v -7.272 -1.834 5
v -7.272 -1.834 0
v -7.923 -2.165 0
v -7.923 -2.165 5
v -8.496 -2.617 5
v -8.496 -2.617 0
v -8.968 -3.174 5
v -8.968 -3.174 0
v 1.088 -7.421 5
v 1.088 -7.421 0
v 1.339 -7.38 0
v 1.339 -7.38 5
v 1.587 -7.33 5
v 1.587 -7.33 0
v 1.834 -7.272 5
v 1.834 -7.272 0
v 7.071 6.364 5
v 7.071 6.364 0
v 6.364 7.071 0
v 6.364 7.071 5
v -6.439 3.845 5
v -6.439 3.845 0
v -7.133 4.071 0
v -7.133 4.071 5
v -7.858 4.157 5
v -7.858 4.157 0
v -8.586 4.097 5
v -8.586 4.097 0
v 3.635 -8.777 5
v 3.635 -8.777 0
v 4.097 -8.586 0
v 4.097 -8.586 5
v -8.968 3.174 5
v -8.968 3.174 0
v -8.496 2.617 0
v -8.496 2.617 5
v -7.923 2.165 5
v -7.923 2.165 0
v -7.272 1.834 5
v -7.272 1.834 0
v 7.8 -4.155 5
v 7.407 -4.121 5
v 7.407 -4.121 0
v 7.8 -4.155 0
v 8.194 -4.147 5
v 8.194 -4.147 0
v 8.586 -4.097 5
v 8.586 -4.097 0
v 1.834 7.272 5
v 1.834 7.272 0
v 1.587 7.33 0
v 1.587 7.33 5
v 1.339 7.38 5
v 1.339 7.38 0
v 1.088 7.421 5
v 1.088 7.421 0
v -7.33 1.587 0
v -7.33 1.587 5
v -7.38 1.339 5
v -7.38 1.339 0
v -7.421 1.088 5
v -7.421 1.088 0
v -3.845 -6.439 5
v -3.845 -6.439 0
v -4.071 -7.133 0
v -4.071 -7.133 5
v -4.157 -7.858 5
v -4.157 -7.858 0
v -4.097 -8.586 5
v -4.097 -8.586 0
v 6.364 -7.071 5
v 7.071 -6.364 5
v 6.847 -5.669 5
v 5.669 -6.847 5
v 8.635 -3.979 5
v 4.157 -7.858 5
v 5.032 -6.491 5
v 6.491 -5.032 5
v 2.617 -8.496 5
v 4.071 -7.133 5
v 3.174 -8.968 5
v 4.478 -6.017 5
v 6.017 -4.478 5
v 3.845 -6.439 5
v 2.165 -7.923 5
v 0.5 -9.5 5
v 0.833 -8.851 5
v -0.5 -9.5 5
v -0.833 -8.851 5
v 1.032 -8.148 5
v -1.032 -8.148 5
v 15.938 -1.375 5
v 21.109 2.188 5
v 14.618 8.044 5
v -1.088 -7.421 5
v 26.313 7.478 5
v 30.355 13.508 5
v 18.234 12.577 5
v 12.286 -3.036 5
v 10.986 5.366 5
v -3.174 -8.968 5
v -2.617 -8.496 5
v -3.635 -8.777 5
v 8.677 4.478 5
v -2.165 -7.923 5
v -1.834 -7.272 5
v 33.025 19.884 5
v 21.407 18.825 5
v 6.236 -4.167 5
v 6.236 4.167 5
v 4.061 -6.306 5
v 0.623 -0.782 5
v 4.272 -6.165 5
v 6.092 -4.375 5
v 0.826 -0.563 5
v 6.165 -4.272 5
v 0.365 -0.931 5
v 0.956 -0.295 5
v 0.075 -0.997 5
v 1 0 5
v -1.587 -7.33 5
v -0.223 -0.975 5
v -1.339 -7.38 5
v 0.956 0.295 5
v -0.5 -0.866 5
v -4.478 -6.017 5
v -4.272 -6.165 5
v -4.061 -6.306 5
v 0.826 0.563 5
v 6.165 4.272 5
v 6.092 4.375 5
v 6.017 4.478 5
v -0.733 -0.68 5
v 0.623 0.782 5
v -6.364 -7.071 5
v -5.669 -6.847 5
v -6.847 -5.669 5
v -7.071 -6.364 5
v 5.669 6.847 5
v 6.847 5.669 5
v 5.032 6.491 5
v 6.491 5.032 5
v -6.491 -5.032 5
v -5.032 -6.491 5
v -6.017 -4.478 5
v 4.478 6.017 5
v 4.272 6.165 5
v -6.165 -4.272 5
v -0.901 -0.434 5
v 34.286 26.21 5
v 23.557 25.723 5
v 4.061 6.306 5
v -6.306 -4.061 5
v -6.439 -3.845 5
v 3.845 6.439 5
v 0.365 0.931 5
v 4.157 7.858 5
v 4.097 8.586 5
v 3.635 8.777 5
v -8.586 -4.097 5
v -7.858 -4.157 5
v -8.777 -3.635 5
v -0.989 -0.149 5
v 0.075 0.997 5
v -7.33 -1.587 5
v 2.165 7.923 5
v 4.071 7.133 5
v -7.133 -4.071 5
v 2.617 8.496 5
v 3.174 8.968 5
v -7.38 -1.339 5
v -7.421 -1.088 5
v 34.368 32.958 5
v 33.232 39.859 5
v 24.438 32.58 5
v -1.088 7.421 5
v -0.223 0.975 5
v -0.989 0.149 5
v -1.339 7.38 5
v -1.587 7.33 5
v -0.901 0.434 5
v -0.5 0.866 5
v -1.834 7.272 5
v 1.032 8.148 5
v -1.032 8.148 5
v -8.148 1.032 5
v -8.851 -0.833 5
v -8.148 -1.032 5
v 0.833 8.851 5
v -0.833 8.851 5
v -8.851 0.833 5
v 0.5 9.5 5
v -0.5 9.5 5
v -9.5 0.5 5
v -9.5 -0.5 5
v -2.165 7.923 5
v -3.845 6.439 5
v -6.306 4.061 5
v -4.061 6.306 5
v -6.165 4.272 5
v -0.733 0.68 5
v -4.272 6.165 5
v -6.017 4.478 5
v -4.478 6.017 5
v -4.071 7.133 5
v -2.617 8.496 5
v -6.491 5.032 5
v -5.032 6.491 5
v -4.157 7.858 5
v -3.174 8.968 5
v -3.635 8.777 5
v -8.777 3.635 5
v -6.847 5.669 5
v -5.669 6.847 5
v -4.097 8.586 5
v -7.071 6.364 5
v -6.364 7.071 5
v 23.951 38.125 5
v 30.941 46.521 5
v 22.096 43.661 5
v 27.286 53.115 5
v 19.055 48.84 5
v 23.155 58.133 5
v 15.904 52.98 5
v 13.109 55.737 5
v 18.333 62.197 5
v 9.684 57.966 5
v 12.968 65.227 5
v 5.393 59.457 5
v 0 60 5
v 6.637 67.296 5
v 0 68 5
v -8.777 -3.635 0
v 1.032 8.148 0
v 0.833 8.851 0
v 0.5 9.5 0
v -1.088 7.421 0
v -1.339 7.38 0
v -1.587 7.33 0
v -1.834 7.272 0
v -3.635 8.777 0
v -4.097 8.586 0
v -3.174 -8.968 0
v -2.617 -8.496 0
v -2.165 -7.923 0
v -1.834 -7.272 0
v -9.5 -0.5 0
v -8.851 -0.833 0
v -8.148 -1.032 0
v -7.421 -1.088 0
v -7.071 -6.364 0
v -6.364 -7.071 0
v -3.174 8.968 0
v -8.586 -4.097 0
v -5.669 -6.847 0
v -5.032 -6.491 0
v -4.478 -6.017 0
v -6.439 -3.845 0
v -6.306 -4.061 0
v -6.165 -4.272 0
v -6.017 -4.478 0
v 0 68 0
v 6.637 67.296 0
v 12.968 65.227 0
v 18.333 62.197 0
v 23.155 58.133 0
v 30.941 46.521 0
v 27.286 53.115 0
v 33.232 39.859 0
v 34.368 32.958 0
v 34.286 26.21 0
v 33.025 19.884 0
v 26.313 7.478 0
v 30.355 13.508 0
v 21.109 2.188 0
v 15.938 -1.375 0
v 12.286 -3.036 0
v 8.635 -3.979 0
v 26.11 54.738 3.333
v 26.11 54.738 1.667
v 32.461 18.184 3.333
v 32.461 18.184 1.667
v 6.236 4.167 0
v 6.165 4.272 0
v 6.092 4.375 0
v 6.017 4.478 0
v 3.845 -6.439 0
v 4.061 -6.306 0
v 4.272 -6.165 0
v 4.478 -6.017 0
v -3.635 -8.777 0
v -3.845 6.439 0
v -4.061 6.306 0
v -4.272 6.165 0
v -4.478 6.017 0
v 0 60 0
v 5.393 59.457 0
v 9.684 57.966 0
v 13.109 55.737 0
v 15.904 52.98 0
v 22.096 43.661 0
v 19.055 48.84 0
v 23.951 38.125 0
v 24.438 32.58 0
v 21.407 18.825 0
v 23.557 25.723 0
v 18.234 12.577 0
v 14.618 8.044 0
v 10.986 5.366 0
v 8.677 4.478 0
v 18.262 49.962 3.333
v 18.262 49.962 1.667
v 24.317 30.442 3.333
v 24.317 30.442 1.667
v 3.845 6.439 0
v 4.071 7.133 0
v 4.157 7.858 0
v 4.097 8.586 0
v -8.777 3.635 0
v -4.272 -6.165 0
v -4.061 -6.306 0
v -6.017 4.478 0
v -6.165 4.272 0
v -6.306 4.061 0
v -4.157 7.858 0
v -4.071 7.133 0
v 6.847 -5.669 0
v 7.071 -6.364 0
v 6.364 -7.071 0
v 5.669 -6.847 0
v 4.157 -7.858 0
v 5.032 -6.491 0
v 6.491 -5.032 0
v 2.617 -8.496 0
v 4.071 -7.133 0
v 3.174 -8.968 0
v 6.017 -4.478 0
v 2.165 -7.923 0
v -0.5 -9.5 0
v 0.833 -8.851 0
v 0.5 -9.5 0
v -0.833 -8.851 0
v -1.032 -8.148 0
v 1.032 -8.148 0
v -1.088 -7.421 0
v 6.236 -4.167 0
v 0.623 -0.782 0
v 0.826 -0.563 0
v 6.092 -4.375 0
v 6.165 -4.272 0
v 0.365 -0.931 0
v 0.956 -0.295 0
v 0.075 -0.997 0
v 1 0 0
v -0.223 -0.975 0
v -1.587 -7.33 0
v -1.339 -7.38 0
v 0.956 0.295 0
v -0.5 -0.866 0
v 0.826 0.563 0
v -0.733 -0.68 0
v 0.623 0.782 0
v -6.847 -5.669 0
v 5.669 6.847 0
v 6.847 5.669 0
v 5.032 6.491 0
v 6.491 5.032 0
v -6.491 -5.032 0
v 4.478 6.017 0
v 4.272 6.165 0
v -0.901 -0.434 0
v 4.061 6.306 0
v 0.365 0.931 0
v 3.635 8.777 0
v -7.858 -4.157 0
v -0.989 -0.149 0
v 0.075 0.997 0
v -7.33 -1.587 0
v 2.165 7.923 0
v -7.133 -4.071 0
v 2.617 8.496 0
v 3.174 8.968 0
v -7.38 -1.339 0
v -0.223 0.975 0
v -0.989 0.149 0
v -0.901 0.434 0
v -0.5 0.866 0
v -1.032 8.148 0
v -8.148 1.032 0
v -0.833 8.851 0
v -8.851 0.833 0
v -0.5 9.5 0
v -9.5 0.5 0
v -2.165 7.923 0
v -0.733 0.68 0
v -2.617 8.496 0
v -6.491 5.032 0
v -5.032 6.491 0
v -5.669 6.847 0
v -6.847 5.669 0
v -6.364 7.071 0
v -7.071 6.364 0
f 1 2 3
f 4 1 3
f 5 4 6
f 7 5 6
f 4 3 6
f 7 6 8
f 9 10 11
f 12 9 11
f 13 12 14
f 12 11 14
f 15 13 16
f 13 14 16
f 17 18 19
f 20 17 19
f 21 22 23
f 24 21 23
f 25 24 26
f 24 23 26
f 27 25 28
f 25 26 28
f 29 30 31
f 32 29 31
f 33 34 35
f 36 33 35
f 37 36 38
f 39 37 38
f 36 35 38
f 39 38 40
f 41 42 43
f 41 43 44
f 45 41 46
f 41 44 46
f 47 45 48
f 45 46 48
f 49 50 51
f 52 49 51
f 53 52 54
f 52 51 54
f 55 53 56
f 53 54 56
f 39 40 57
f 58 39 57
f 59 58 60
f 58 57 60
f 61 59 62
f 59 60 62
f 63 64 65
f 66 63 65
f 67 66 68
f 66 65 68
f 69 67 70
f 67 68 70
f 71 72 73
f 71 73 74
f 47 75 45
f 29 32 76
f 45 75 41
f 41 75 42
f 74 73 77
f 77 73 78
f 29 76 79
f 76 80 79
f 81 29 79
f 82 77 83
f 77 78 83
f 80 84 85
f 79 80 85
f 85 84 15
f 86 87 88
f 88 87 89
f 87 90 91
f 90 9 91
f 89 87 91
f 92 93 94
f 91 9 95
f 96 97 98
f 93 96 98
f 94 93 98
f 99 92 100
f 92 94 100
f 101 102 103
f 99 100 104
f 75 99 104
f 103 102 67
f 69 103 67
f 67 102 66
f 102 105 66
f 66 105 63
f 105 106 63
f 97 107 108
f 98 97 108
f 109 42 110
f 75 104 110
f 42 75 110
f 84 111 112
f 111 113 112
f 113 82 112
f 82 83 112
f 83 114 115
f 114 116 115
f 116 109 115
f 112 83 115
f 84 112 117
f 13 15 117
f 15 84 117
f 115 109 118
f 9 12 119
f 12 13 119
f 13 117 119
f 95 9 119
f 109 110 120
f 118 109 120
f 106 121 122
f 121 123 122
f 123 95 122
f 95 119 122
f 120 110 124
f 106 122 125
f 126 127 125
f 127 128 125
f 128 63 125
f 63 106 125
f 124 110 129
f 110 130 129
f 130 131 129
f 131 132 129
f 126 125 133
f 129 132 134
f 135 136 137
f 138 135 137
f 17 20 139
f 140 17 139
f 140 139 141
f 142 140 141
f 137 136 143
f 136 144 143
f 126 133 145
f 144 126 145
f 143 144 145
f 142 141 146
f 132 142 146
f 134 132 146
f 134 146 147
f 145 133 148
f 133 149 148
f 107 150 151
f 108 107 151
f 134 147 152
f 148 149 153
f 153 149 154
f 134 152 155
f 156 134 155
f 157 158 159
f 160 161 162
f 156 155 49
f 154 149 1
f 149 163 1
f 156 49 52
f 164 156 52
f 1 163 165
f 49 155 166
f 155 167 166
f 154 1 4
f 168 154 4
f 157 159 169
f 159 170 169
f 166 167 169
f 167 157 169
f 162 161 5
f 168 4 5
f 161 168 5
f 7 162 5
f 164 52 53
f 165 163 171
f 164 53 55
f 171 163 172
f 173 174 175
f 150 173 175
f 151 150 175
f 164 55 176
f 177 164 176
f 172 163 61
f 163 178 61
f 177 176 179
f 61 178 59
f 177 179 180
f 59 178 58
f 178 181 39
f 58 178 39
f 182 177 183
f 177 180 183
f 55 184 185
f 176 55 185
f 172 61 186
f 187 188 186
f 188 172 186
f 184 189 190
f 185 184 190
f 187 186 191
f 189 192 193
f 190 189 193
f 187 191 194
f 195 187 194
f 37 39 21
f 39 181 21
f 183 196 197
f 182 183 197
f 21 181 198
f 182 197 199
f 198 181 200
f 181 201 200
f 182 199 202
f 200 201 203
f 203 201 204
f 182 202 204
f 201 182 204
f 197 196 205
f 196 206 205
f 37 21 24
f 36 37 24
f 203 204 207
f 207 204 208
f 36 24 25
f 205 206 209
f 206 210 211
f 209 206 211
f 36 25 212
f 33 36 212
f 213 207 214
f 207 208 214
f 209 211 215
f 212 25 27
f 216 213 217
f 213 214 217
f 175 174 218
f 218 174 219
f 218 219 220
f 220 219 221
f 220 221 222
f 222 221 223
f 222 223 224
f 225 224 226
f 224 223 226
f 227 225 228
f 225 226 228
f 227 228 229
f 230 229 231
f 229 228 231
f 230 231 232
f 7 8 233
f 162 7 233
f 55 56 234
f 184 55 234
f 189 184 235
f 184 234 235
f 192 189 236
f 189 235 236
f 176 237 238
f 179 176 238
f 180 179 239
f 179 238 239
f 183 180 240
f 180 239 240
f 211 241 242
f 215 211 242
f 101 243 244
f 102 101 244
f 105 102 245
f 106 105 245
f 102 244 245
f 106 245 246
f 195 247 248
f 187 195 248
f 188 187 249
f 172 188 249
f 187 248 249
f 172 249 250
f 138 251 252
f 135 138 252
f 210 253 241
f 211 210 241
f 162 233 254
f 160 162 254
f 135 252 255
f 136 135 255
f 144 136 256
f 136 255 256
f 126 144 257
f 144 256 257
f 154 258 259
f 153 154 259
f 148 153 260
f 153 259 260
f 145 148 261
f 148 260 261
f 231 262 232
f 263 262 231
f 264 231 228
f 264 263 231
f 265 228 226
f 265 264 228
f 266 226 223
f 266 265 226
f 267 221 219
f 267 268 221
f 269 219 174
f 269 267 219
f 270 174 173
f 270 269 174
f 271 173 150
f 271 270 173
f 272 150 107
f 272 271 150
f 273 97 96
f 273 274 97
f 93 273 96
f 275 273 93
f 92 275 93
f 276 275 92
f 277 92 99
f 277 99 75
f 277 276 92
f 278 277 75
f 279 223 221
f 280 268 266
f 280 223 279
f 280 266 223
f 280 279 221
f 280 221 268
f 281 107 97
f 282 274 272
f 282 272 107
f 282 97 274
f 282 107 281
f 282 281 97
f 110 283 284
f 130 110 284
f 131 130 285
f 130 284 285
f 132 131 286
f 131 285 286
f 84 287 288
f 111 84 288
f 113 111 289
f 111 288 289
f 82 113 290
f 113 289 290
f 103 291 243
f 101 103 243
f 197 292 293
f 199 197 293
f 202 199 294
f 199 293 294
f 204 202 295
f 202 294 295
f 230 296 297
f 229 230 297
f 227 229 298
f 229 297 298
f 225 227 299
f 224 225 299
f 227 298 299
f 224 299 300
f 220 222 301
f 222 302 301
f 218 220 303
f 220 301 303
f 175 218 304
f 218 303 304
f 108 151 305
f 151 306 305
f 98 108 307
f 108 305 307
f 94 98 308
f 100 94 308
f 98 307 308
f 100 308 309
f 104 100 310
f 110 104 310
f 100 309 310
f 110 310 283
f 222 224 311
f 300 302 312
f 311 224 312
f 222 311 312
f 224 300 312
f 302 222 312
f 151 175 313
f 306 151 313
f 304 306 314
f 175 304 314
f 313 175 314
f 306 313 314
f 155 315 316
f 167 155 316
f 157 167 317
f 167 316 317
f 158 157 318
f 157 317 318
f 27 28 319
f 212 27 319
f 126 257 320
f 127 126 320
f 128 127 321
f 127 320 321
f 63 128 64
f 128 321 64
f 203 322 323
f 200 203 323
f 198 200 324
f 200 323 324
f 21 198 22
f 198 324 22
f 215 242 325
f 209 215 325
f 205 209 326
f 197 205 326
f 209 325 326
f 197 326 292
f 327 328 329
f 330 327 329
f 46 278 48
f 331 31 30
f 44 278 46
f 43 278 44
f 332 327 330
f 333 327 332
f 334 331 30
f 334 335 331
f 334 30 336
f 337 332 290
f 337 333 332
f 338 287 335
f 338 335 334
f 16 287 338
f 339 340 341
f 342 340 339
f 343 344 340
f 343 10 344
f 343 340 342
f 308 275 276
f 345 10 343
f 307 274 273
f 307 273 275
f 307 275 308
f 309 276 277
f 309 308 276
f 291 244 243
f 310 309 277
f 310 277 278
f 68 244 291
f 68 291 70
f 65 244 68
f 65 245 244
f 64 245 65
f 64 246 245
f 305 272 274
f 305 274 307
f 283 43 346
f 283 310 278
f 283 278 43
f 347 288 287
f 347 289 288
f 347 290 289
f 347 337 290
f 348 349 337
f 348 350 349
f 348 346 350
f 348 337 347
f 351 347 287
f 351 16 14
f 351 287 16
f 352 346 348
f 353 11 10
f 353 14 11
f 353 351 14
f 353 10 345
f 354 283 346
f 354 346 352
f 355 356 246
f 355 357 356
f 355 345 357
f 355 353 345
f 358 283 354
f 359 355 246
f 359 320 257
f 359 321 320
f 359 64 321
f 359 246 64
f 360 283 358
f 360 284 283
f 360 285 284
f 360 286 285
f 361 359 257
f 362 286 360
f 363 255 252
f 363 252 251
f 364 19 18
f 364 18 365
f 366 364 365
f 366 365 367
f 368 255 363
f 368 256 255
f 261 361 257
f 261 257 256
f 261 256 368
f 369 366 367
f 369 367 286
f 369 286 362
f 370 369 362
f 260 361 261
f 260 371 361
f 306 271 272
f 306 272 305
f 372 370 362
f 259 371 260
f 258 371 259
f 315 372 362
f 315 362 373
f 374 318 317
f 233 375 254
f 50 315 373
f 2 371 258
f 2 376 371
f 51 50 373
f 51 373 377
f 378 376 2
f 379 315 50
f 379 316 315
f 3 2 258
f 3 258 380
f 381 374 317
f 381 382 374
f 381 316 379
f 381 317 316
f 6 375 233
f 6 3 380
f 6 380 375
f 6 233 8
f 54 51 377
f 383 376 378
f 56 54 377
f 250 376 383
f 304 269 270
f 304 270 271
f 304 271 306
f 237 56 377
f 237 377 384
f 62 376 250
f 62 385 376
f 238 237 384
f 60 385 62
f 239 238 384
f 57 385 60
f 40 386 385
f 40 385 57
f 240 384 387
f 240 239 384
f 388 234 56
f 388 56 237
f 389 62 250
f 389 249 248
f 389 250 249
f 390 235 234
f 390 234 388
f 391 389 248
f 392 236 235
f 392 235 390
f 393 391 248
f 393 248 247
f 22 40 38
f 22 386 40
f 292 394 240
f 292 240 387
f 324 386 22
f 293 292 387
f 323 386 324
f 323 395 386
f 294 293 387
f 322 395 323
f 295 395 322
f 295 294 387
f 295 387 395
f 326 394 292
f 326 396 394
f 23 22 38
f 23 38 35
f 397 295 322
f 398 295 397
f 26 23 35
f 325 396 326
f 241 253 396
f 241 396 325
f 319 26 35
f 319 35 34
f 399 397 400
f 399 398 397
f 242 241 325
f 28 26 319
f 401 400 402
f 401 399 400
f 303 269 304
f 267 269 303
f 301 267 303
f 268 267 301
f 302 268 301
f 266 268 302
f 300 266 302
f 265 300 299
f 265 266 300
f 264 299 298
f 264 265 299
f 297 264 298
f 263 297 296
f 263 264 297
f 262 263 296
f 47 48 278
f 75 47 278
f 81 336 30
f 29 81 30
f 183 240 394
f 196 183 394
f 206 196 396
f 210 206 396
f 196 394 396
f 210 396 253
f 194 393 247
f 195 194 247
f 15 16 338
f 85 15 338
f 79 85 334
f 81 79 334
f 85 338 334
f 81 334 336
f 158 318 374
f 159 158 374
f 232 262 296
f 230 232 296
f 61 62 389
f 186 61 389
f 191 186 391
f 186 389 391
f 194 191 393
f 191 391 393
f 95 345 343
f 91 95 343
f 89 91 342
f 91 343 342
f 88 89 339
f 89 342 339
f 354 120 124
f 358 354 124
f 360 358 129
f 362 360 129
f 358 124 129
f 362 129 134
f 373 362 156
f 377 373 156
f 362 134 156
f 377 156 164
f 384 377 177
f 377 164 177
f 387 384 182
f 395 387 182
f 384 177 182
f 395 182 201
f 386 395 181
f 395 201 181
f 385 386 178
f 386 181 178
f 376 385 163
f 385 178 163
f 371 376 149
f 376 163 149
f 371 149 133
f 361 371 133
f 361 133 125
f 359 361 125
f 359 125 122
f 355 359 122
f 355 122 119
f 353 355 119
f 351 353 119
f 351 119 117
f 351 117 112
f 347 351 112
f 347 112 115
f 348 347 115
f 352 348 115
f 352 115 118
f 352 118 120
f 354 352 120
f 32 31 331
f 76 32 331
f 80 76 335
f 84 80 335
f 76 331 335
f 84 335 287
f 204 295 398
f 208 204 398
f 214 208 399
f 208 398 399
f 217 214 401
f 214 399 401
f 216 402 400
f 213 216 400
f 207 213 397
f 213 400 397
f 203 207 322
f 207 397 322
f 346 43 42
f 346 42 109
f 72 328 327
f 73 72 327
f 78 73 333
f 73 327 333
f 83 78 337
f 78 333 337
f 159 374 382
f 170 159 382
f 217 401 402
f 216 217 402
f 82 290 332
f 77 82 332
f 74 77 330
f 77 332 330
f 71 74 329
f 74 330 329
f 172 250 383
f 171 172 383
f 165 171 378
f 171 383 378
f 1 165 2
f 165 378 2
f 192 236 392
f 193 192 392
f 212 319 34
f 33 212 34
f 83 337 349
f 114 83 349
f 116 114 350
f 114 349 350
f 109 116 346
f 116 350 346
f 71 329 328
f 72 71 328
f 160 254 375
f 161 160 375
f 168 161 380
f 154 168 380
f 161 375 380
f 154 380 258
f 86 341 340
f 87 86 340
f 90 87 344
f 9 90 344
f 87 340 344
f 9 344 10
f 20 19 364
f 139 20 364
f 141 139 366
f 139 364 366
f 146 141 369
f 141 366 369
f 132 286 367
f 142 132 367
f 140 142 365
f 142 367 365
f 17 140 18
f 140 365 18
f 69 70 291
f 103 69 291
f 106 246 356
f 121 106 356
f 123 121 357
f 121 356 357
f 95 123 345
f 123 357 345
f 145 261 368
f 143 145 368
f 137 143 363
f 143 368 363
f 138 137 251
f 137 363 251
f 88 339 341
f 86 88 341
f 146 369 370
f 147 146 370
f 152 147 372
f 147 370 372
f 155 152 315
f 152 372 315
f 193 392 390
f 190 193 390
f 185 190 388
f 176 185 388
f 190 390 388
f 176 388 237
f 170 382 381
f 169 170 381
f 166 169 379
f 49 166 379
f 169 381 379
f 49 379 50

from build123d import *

# Parameters (mm, degrees)
F1_DEPTH = 5
F2_R     = 1
F3_DEPTH = 5.001
F5_DEPTH = 5


with BuildPart() as f1:
    # F0 (on Top) → F1 (new body)
    with BuildSketch(Plane.XY):
        with BuildLine():
            ThreePointArc((7.4206173165, -1.0883191822), (7.4801280027, -0.5456052265), (7.5, 0))
            ThreePointArc((7.5, 0), (7.4801280027, 0.5456052265), (7.4206173165, 1.0883191822))
            ThreePointArc((7.4206173165, 1.0883191822), (7.355889603, 1.4631774151), (7.2722381774, 1.8342714877))
            ThreePointArc((7.2722381774, 1.8342714877), (6.9290964938, 2.8701257427), (6.4392747372, 3.8452231222))
            ThreePointArc((6.4392747372, 3.8452231222), (6.2360220923, 4.1667767476), (6.0167266989, 4.4776109513))
            ThreePointArc((6.0167266989, 4.4776109513), (5.3033008589, 5.3033008589), (4.4776109513, 6.0167266989))
            ThreePointArc((4.4776109513, 6.0167266989), (4.1667767476, 6.2360220923), (3.8452231222, 6.4392747372))
            ThreePointArc((3.8452231222, 6.4392747372), (2.8701257427, 6.9290964938), (1.8342714877, 7.2722381774))
            ThreePointArc((1.8342714877, 7.2722381774), (1.4631774151, 7.355889603), (1.0883191822, 7.4206173165))
            ThreePointArc((1.0883191822, 7.4206173165), (0, 7.5), (-1.0883191822, 7.4206173165))
            ThreePointArc((-1.0883191822, 7.4206173165), (-1.4631774151, 7.355889603), (-1.8342714877, 7.2722381774))
            ThreePointArc((-1.8342714877, 7.2722381774), (-2.8701257427, 6.9290964938), (-3.8452231222, 6.4392747372))
            ThreePointArc((-3.8452231222, 6.4392747372), (-4.1667767476, 6.2360220923), (-4.4776109513, 6.0167266989))
            ThreePointArc((-4.4776109513, 6.0167266989), (-5.3033008589, 5.3033008589), (-6.0167266989, 4.4776109513))
            ThreePointArc((-6.0167266989, 4.4776109513), (-6.2360220923, 4.1667767476), (-6.4392747372, 3.8452231222))
            ThreePointArc((-6.4392747372, 3.8452231222), (-6.9290964938, 2.8701257427), (-7.2722381774, 1.8342714877))
            ThreePointArc((-7.2722381774, 1.8342714877), (-7.355889603, 1.4631774151), (-7.4206173165, 1.0883191822))
            ThreePointArc((-7.4206173165, 1.0883191822), (-7.5, 0), (-7.4206173165, -1.0883191822))
            ThreePointArc((-7.4206173165, -1.0883191822), (-7.355889603, -1.4631774151), (-7.2722381774, -1.8342714877))
            ThreePointArc((-7.2722381774, -1.8342714877), (-6.9290964938, -2.8701257427), (-6.4392747372, -3.8452231222))
            ThreePointArc((-6.4392747372, -3.8452231222), (-6.2360220923, -4.1667767476), (-6.0167266989, -4.4776109513))
            ThreePointArc((-6.0167266989, -4.4776109513), (-5.3033008589, -5.3033008589), (-4.4776109513, -6.0167266989))
            ThreePointArc((-4.4776109513, -6.0167266989), (-4.1667767476, -6.2360220923), (-3.8452231222, -6.4392747372))
            ThreePointArc((-3.8452231222, -6.4392747372), (-2.8701257427, -6.9290964938), (-1.8342714877, -7.2722381774))
            ThreePointArc((-1.8342714877, -7.2722381774), (-1.4631774151, -7.355889603), (-1.0883191822, -7.4206173165))
            ThreePointArc((-1.0883191822, -7.4206173165), (0, -7.5), (1.0883191822, -7.4206173165))
            ThreePointArc((1.0883191822, -7.4206173165), (1.4631774151, -7.355889603), (1.8342714877, -7.2722381774))
            ThreePointArc((1.8342714877, -7.2722381774), (2.8701257427, -6.9290964938), (3.8452231222, -6.4392747372))
            ThreePointArc((3.8452231222, -6.4392747372), (4.1667767476, -6.2360220923), (4.4776109513, -6.0167266989))
            ThreePointArc((4.4776109513, -6.0167266989), (5.3033008589, -5.3033008589), (6.0167266989, -4.4776109513))
            ThreePointArc((6.0167266989, -4.4776109513), (6.2360220923, -4.1667767476), (6.4392747372, -3.8452231222))
            ThreePointArc((6.4392747372, -3.8452231222), (6.9290964938, -2.8701257427), (7.2722381774, -1.8342714877))
            ThreePointArc((7.2722381774, -1.8342714877), (7.355889603, -1.4631774151), (7.4206173165, -1.0883191822))
        make_face()
        with BuildLine():
            ThreePointArc((7.4206173165, 1.0883191822), (7.4801280027, 0.5456052265), (7.5, 0))
            ThreePointArc((7.5, 0), (7.4801280027, -0.5456052265), (7.4206173165, -1.0883191822))
            ThreePointArc((7.4206173165, -1.0883191822), (8.5043518229, -0.9498278009), (9.5, -0.5))
            Line((9.5, -0.5), (9.5, 0))
            Line((9.5, 0), (9.5, 0.5))
            ThreePointArc((9.5, 0.5), (8.5043518229, 0.9498278009), (7.4206173165, 1.0883191822))
        make_face()
        with BuildLine():
            ThreePointArc((6.4392747372, 3.8452231222), (6.9290964938, 2.8701257427), (7.2722381774, 1.8342714877))
            ThreePointArc((7.2722381774, 1.8342714877), (8.2204799494, 2.376948081), (8.968197275, 3.1735528412))
            Line((8.968197275, 3.1735528412), (8.7768555589, 3.6354926075))
            Line((8.7768555589, 3.6354926075), (8.5855138427, 4.0974323737))
            ThreePointArc((8.5855138427, 4.0974323737), (7.4935132234, 4.1320010103), (6.4392747372, 3.8452231222))
        make_face()
        with BuildLine():
            ThreePointArc((8.968197275, -3.1735528412), (8.2204799494, -2.376948081), (7.2722381774, -1.8342714877))
            ThreePointArc((7.2722381774, -1.8342714877), (6.9290964938, -2.8701257427), (6.4392747372, -3.8452231222))
            ThreePointArc((6.4392747372, -3.8452231222), (7.4935132234, -4.1320010103), (8.5855138427, -4.0974323737))
            Line((8.5855138427, -4.0974323737), (8.7768555589, -3.6354926075))
            Line((8.7768555589, -3.6354926075), (8.968197275, -3.1735528412))
        make_face()
        with BuildLine():
            ThreePointArc((4.4776109513, 6.0167266989), (5.3033008589, 5.3033008589), (6.0167266989, 4.4776109513))
            ThreePointArc((6.0167266989, 4.4776109513), (6.6851145225, 5.3418551646), (7.0710678119, 6.3639610307))
            Line((7.0710678119, 6.3639610307), (6.7175144213, 6.7175144213))
            Line((6.7175144213, 6.7175144213), (6.3639610307, 7.0710678119))
            ThreePointArc((6.3639610307, 7.0710678119), (5.3418551646, 6.6851145225), (4.4776109513, 6.0167266989))
        make_face()
        with BuildLine():
            ThreePointArc((7.0710678119, -6.3639610307), (6.6851145225, -5.3418551646), (6.0167266989, -4.4776109513))
            ThreePointArc((6.0167266989, -4.4776109513), (5.3033008589, -5.3033008589), (4.4776109513, -6.0167266989))
            ThreePointArc((4.4776109513, -6.0167266989), (5.3418551646, -6.6851145225), (6.3639610307, -7.0710678119))
            Line((6.3639610307, -7.0710678119), (6.7175144213, -6.7175144213))
            Line((6.7175144213, -6.7175144213), (7.0710678119, -6.3639610307))
        make_face()
        with BuildLine():
            ThreePointArc((1.8342714877, 7.2722381774), (2.8701257427, 6.9290964938), (3.8452231222, 6.4392747372))
            ThreePointArc((3.8452231222, 6.4392747372), (4.1320010103, 7.4935132234), (4.0974323737, 8.5855138427))
            Line((4.0974323737, 8.5855138427), (3.6354926075, 8.7768555589))
            Line((3.6354926075, 8.7768555589), (3.1735528412, 8.968197275))
            ThreePointArc((3.1735528412, 8.968197275), (2.376948081, 8.2204799494), (1.8342714877, 7.2722381774))
        make_face()
        with BuildLine():
            ThreePointArc((4.0974323737, -8.5855138427), (4.1320010103, -7.4935132234), (3.8452231222, -6.4392747372))
            ThreePointArc((3.8452231222, -6.4392747372), (2.8701257427, -6.9290964938), (1.8342714877, -7.2722381774))
            ThreePointArc((1.8342714877, -7.2722381774), (2.376948081, -8.2204799494), (3.1735528412, -8.968197275))
            Line((3.1735528412, -8.968197275), (3.6354926075, -8.7768555589))
            Line((3.6354926075, -8.7768555589), (4.0974323737, -8.5855138427))
        make_face()
        with BuildLine():
            ThreePointArc((-1.0883191822, 7.4206173165), (0, 7.5), (1.0883191822, 7.4206173165))
            ThreePointArc((1.0883191822, 7.4206173165), (0.9498278009, 8.5043518229), (0.5, 9.5))
            Line((0.5, 9.5), (0, 9.5))
            Line((0, 9.5), (-0.5, 9.5))
            ThreePointArc((-0.5, 9.5), (-0.9498278009, 8.5043518229), (-1.0883191822, 7.4206173165))
        make_face()
        with BuildLine():
            ThreePointArc((0.5, -9.5), (0.9498278009, -8.5043518229), (1.0883191822, -7.4206173165))
            ThreePointArc((1.0883191822, -7.4206173165), (0, -7.5), (-1.0883191822, -7.4206173165))
            ThreePointArc((-1.0883191822, -7.4206173165), (-0.9498278009, -8.5043518229), (-0.5, -9.5))
            Line((-0.5, -9.5), (0, -9.5))
            Line((0, -9.5), (0.5, -9.5))
        make_face()
        with BuildLine():
            ThreePointArc((-3.8452231222, 6.4392747372), (-2.8701257427, 6.9290964938), (-1.8342714877, 7.2722381774))
            ThreePointArc((-1.8342714877, 7.2722381774), (-2.376948081, 8.2204799494), (-3.1735528412, 8.968197275))
            Line((-3.1735528412, 8.968197275), (-3.6354926075, 8.7768555589))
            Line((-3.6354926075, 8.7768555589), (-4.0974323737, 8.5855138427))
            ThreePointArc((-4.0974323737, 8.5855138427), (-4.1320010103, 7.4935132234), (-3.8452231222, 6.4392747372))
        make_face()
        with BuildLine():
            ThreePointArc((-3.1735528412, -8.968197275), (-2.376948081, -8.2204799494), (-1.8342714877, -7.2722381774))
            ThreePointArc((-1.8342714877, -7.2722381774), (-2.8701257427, -6.9290964938), (-3.8452231222, -6.4392747372))
            ThreePointArc((-3.8452231222, -6.4392747372), (-4.1320010103, -7.4935132234), (-4.0974323737, -8.5855138427))
            Line((-4.0974323737, -8.5855138427), (-3.6354926075, -8.7768555589))
            Line((-3.6354926075, -8.7768555589), (-3.1735528412, -8.968197275))
        make_face()
        with BuildLine():
            ThreePointArc((-6.0167266989, 4.4776109513), (-5.3033008589, 5.3033008589), (-4.4776109513, 6.0167266989))
            ThreePointArc((-4.4776109513, 6.0167266989), (-5.3418551646, 6.6851145225), (-6.3639610307, 7.0710678119))
            Line((-6.3639610307, 7.0710678119), (-6.7175144213, 6.7175144213))
            Line((-6.7175144213, 6.7175144213), (-7.0710678119, 6.3639610307))
            ThreePointArc((-7.0710678119, 6.3639610307), (-6.6851145225, 5.3418551646), (-6.0167266989, 4.4776109513))
        make_face()
        with BuildLine():
            ThreePointArc((-6.3639610307, -7.0710678119), (-5.3418551646, -6.6851145225), (-4.4776109513, -6.0167266989))
            ThreePointArc((-4.4776109513, -6.0167266989), (-5.3033008589, -5.3033008589), (-6.0167266989, -4.4776109513))
            ThreePointArc((-6.0167266989, -4.4776109513), (-6.6851145225, -5.3418551646), (-7.0710678119, -6.3639610307))
            Line((-7.0710678119, -6.3639610307), (-6.7175144213, -6.7175144213))
            Line((-6.7175144213, -6.7175144213), (-6.3639610307, -7.0710678119))
        make_face()
        with BuildLine():
            ThreePointArc((-7.2722381774, 1.8342714877), (-6.9290964938, 2.8701257427), (-6.4392747372, 3.8452231222))
            ThreePointArc((-6.4392747372, 3.8452231222), (-7.4935132234, 4.1320010103), (-8.5855138427, 4.0974323737))
            Line((-8.5855138427, 4.0974323737), (-8.7768555589, 3.6354926075))
            Line((-8.7768555589, 3.6354926075), (-8.968197275, 3.1735528412))
            ThreePointArc((-8.968197275, 3.1735528412), (-8.2204799494, 2.376948081), (-7.2722381774, 1.8342714877))
        make_face()
        with BuildLine():
            ThreePointArc((-8.5855138427, -4.0974323737), (-7.4935132234, -4.1320010103), (-6.4392747372, -3.8452231222))
            ThreePointArc((-6.4392747372, -3.8452231222), (-6.9290964938, -2.8701257427), (-7.2722381774, -1.8342714877))
            ThreePointArc((-7.2722381774, -1.8342714877), (-8.2204799494, -2.376948081), (-8.968197275, -3.1735528412))
            Line((-8.968197275, -3.1735528412), (-8.7768555589, -3.6354926075))
            Line((-8.7768555589, -3.6354926075), (-8.5855138427, -4.0974323737))
        make_face()
        with BuildLine():
            ThreePointArc((-7.4206173165, -1.0883191822), (-7.5, 0), (-7.4206173165, 1.0883191822))
            ThreePointArc((-7.4206173165, 1.0883191822), (-8.5043518229, 0.9498278009), (-9.5, 0.5))
            Line((-9.5, 0.5), (-9.5, 0))
            Line((-9.5, 0), (-9.5, -0.5))
            ThreePointArc((-9.5, -0.5), (-8.5043518229, -0.9498278009), (-7.4206173165, -1.0883191822))
        make_face()
    extrude(amount=F1_DEPTH)

    # F2 (on face) → F3 (cut, through all)
    with BuildSketch(Plane.XY.offset(5)):
        Circle(F2_R)
    extrude(amount=-F3_DEPTH, mode=Mode.SUBTRACT)

    # F4 (on Top) → F5 (join, through all)
    with BuildSketch(Plane.XY):
        with BuildLine():
            add(Edge.make_bspline(
                [(0, 68), (10, 68), (30.3411100865, 57.9511873452), (40.3926177616, 16.7956269276), (16.2360220923, -4.1667767476), (6.2360220923, -4.1667767476)],
                knots=[0, 0, 0, 0, 0.3114999197, 0.6621103025, 1, 1, 1, 1], degree=3))
            Line((0, 68), (0, 60))
            add(Edge.make_bspline(
                [(0, 60), (10, 60), (18.8927354151, 50.4787600801), (28.9855676731, 32.0157628547), (16.2360220923, 4.1667767476), (6.2360220923, 4.1667767476)],
                knots=[0, 0, 0, 0, 0.3098430419, 0.6166815096, 1, 1, 1, 1], degree=3))
            Line((6.2360220923, 4.1667767476), (6.2360220923, -4.1667767476))
        make_face()
    extrude(amount=F5_DEPTH)


solid = f1.part
